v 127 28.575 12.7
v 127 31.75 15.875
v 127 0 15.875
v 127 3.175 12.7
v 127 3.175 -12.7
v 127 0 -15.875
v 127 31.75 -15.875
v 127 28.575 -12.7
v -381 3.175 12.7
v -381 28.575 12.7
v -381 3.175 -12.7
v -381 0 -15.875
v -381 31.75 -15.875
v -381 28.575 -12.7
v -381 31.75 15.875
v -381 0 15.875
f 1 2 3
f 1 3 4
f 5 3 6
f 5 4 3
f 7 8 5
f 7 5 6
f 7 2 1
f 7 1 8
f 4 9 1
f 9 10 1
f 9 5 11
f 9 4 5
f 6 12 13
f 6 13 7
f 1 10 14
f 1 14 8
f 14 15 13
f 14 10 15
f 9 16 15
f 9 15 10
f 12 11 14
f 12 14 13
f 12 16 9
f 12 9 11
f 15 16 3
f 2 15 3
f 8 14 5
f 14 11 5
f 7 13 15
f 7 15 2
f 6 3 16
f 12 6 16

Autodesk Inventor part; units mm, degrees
ref_plane "YZ Plane" through (0, 0, 0) normal (1, 0, 0) x (0, 1, 0)
ref_plane "XZ Plane" through (0, 0, 0) normal (0, 1, 0) x (-1, 0, 0)
ref_plane "XY Plane" through (0, 0, 0) normal (0, 0, 1) x (1, 0, 0)
sketch "Sketch1" plane through (0, 0, 0) normal (0, 1, 0) x (-1, 0, 0)
  line L0 (381, 15.875) -> (-381, 15.875)
  line L1 (-381, 15.875) -> (-381, -15.875)
  line L2 (-381, -15.875) -> (381, -15.875)
  line L3 (381, -15.875) -> (381, 15.875)
  point P0 (0, 0)
  dimension "d0" = 762
  dimension "d1" = 31.75
extrude "Extrusion1" add sketch "Sketch1" along normal blind 3.175
sketch "Sketch2" plane through (-381, 0, 15.875) normal (0, 0, 1) x (1, 0, 0)
  line L0 (0, 3.175) -> (762, 3.175) projected
  line L1 (762, 28.575) -> (0, 28.575)
  line L2 (0, 28.575) -> (0, 3.175)
  line L3 (0, 3.175) -> (762, 3.175)
  line L4 (762, 3.175) -> (762, 28.575)
  point P0 (381, 0)
extrude "Extrusion2" add sketch "Sketch2" against normal blind 3.175
sketch "Sketch3" plane through (-381, 28.575, 15.875) normal (0, 1, 0) x (1, 0, 0)
  line L0 (0, 3.175) -> (762, 3.175) projected
  line L1 (762, 28.575) -> (0, 28.575)
  line L2 (0, 28.575) -> (0, 3.175)
  line L3 (0, 3.175) -> (762, 3.175)
  line L4 (762, 3.175) -> (762, 28.575)
  point P0 (381, 15.875)
extrude "Extrusion3" add sketch "Sketch3" against normal blind 3.175
sketch "Sketch4" plane through (381, 28.575, -12.7) normal (0, 0, -1) x (-1, 0, 0)
  line L0 (762, 0) -> (0, 0) projected
  line L1 (0, -25.4) -> (762, -25.4) projected
  line L2 (0, -3.175) -> (0, -25.4) projected
  line L3 (762, -25.4) -> (762, -3.175) projected
  line L4 (762, 0) -> (0, 0)
  line L5 (0, 0) -> (0, -25.4)
  line L6 (0, -25.4) -> (762, -25.4)
  line L7 (762, -25.4) -> (762, 0)
  point P0 (381, -28.575)
extrude "Extrusion4" add sketch "Sketch4" along normal blind 3.175
sketch "Sketch5" plane through (-381, 28.575, 15.875) normal (0, 1, 0) x (1, 0, 0)
  line L0 (0, 31.75) -> (762, 31.75) projected
  line L1 (0, 0) -> (762, 0) projected
  line L2 (762, 0) -> (762, 31.75) projected
  line L3 (0, 31.75) -> (762, 31.75) projected
  line L4 (0, 0) -> (0, 31.75) projected
  line L5 (0, 31.75) -> (762, 31.75)
  line L6 (762, 31.75) -> (762, 0)
  line L7 (762, 0) -> (0, 0)
  line L8 (0, 0) -> (0, 31.75)
  point P0 (381, 15.875)
extrude "Extrusion5" add sketch "Sketch5" along normal blind 3.175
sketch "Sketch6" plane through (-381, 25.4, 15.875) normal (0, -1, 0) x (1, 0, 0)
  line L0 (0, -3.175) -> (0, -28.575) projected
  line L1 (0, -28.575) -> (762, -28.575) projected
  line L2 (762, -28.575) -> (762, -3.175) projected
  line L3 (0, -3.175) -> (762, -3.175) projected
  line L4 (762, -3.175) -> (0, -3.175)
  line L5 (0, -3.175) -> (0, -28.575)
  line L6 (0, -28.575) -> (762, -28.575)
  line L7 (762, -28.575) -> (762, -3.175)
  point P0 (381, -15.875)
extrude "Extrusion6" cut sketch "Sketch6" against normal blind 3.175
sketch "Sketch7" plane through (381, 0, 15.875) normal (1, 0, 0) x (0, 0, -1)
  line L0 (0, 31.75) -> (31.75, 31.75) projected
  line L1 (31.75, 0) -> (31.75, 31.75) projected
  line L2 (0, 31.75) -> (31.75, 31.75) projected
  line L3 (0, 0) -> (0, 31.75) projected
  line L4 (0, 0) -> (31.75, 0) projected
  line L5 (3.175, 28.575) -> (3.175, 3.175) projected
  line L6 (3.175, 28.575) -> (28.575, 28.575) projected
  line L7 (28.575, 28.575) -> (28.575, 3.175) projected
  line L8 (3.175, 3.175) -> (28.575, 3.175) projected
  line L9 (0, 0) -> (0, 31.75) projected
  line L10 (0, 31.75) -> (31.75, 31.75)
  line L11 (31.75, 31.75) -> (31.75, 0)
  line L12 (31.75, 0) -> (0, 0)
  line L13 (0, 0) -> (0, 31.75)
  line L14 (3.175, 28.575) -> (28.575, 28.575)
  line L15 (28.575, 28.575) -> (28.575, 3.175)
  line L16 (28.575, 3.175) -> (3.175, 3.175)
  line L17 (3.175, 3.175) -> (3.175, 28.575)
  point P0 (15.875, 0)
extrude "Extrusion7" cut sketch "Sketch7" against normal blind 254
properties part number "alignmentWheelsBarSolid"
